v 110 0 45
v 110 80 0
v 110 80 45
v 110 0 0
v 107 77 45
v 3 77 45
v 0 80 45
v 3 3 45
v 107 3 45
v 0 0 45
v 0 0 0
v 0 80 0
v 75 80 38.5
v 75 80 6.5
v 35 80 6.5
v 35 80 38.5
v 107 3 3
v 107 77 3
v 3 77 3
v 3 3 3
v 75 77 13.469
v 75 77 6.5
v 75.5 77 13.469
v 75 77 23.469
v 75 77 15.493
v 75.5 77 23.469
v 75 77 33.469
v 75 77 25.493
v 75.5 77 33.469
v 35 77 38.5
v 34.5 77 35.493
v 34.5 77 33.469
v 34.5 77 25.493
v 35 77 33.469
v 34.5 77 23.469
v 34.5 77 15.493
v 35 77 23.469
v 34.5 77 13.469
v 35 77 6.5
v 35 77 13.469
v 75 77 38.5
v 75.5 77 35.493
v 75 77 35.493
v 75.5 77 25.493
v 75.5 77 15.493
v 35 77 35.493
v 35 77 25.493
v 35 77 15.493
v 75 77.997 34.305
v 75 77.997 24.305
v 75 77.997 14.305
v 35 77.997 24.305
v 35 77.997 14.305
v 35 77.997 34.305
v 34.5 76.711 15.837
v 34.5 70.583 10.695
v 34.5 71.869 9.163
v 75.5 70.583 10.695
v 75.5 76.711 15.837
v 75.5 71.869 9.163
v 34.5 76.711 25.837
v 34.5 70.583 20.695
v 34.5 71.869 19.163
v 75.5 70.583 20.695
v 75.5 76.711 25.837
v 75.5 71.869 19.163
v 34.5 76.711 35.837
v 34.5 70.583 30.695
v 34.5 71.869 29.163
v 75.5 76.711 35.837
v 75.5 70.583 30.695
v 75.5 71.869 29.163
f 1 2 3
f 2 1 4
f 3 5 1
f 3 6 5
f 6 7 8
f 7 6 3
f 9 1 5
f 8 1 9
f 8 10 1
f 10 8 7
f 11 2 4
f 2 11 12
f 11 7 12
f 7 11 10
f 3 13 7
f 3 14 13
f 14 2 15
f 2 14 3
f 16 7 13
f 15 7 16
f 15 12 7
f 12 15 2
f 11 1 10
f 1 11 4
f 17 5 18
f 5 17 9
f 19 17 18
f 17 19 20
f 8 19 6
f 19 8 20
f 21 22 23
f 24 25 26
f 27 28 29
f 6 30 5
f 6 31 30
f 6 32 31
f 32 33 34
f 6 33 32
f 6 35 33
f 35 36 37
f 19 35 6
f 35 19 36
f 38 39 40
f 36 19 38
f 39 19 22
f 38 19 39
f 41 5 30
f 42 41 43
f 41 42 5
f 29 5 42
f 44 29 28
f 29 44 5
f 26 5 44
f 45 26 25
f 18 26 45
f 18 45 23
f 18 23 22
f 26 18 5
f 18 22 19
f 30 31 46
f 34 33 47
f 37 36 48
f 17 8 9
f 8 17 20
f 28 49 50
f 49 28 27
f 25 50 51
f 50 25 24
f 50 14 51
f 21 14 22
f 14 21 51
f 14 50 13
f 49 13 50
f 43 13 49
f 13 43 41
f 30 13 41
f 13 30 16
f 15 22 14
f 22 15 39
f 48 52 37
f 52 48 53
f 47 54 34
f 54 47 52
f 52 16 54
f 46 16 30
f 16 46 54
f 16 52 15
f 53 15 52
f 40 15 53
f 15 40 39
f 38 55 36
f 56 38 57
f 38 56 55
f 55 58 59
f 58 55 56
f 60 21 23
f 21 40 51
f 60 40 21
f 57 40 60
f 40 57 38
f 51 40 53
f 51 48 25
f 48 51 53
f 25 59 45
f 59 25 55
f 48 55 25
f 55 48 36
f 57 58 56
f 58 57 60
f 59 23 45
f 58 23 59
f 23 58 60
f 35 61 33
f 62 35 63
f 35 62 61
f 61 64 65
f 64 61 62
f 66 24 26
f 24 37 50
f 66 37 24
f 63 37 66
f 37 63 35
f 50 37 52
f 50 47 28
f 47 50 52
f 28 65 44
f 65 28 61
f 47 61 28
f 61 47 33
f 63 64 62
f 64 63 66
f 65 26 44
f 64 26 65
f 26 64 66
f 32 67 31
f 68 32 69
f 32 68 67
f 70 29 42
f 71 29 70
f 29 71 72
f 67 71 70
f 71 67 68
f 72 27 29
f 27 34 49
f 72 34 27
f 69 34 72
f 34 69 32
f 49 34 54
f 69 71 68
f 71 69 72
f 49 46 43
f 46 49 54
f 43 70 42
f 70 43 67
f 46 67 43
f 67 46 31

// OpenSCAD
$fn = 32;

// ----------------------------------------------------------------------
// Vent box: louvers enclosure
// ----------------------------------------------------------------------

// --- parameters (mm) ---
box_l = 110;              // box length, X
box_w = 80;               // box width, Y
box_h = 45;               // box height, Z
wall_t = 3;               // shell wall thickness
win_l = 40;               // vent window width, X
win_h = 32;               // vent window height, Z
slat_t = 2;               // louver slat thickness
slat_d = 8;               // louver slat depth
slat_a = 40;              // louver slat angle, degrees
slat_pitch = 10;          // louver pitch
slat_yc = 74.29;          // slat centreline Y

win_z0 = (box_h - win_h) / 2;  // window lower edge Z
n_slats = 3;  // louver count
slat_z0 = win_z0 + (win_h - (n_slats - 1) * slat_pitch) / 2;

difference() {
  union() {
    difference() {
      cube([box_l, box_w, box_h]);
  translate([wall_t, wall_t, wall_t])
    cube([box_l - 2 * wall_t, box_w - 2 * wall_t, box_h]);
  translate([(box_l - win_l) / 2, box_w - wall_t - 1, win_z0])
    cube([win_l, wall_t + 2, win_h]);
    }
    for (i = [0 : n_slats - 1])
      translate([box_l / 2, slat_yc, slat_z0 + i * slat_pitch])
        rotate([slat_a, 0, 0])
          cube([win_l + 1, slat_d, slat_t], center = true);
  }
}
